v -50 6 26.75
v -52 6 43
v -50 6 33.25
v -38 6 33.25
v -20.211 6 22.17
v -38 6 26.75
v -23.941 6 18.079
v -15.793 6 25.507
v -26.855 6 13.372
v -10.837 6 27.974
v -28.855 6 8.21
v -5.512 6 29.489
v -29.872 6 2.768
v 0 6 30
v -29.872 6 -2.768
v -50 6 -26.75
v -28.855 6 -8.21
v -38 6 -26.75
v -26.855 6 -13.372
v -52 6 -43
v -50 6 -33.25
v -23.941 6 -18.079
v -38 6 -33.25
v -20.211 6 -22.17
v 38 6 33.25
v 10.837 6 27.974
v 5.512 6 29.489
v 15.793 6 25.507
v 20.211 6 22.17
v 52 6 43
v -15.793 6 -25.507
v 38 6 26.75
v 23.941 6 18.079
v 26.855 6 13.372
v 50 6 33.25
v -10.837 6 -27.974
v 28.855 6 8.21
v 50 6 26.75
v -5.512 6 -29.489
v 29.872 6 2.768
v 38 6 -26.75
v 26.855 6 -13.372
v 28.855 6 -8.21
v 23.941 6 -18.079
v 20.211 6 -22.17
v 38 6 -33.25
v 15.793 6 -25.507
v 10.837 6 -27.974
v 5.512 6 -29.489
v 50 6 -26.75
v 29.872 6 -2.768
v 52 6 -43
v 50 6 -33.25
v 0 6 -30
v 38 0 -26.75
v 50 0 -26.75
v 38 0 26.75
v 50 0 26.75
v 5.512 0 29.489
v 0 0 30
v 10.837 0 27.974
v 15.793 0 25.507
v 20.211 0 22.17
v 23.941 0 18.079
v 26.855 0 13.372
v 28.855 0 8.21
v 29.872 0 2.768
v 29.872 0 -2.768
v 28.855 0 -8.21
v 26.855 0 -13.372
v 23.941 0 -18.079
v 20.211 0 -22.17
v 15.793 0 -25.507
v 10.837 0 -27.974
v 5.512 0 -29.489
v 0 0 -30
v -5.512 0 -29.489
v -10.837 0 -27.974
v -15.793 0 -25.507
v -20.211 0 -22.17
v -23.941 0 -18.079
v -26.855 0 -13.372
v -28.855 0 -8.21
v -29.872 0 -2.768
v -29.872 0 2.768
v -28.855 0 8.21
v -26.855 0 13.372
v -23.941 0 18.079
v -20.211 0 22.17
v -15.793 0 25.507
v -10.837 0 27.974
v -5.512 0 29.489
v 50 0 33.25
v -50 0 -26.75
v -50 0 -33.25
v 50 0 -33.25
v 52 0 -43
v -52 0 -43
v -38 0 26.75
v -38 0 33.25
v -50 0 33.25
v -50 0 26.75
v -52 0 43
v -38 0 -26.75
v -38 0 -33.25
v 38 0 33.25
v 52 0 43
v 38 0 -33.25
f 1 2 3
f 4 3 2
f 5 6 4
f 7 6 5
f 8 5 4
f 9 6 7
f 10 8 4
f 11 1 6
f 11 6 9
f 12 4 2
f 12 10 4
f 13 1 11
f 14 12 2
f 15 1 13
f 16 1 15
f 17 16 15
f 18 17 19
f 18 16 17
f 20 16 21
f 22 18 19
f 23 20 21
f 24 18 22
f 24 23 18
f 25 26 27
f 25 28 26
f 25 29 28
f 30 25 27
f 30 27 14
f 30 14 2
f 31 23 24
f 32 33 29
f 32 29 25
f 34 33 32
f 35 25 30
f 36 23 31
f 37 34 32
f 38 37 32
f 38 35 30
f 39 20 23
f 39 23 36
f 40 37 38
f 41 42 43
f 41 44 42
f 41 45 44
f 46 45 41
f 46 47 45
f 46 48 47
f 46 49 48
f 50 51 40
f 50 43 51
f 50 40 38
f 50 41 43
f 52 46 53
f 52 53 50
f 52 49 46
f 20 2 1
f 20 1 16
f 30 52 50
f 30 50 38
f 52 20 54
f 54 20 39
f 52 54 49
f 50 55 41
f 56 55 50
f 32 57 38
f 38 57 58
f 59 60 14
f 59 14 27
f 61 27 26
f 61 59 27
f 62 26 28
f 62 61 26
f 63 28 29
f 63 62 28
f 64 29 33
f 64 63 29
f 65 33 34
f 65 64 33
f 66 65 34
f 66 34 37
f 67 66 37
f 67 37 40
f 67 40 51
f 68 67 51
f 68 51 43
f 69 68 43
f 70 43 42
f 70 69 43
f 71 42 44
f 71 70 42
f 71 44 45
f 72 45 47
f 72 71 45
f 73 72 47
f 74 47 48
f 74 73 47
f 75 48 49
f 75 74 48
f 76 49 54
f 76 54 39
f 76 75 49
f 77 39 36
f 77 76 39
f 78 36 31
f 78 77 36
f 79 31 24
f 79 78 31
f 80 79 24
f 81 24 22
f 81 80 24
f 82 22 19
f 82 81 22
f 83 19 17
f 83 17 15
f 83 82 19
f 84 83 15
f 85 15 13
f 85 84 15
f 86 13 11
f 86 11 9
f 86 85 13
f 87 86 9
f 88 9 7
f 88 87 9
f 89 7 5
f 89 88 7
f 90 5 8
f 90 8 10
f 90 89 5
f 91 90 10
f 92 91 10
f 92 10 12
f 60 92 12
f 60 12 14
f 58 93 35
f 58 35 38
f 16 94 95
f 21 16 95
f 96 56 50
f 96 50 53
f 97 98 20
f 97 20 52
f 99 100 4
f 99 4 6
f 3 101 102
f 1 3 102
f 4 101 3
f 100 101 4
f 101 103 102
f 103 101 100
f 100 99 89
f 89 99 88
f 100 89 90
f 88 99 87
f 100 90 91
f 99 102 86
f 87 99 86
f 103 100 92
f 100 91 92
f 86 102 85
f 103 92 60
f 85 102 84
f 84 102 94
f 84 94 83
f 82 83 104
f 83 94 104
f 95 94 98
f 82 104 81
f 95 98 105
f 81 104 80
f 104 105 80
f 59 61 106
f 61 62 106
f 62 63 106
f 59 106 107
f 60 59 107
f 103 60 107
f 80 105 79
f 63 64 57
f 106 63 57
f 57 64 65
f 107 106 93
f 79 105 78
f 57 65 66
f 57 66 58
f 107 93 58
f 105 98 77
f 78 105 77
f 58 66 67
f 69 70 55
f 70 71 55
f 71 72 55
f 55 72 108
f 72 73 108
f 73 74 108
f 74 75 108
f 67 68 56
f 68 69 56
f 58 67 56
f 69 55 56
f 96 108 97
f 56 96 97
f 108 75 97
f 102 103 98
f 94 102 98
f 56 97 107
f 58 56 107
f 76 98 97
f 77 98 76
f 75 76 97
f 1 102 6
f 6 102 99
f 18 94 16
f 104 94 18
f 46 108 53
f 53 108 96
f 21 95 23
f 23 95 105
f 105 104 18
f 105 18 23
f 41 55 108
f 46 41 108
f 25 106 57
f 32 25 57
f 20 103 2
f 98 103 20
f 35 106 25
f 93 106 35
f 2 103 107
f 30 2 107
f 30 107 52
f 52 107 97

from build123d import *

# Parameters (mm, degrees)
SKETCH1_W                = 104
SKETCH1_H                = 86
SKETCH1_R                = 30
SKETCH1_W_2              = 12
SKETCH1_H_2              = 6.5
MOTOR_CRADLE_PLATE_DEPTH = 6


with BuildPart() as part:
    # Sketch1 → Motor_Cradle_Plate (new body)
    with BuildSketch(Plane(origin=(0, 0, 0), x_dir=(1, 0, 0), z_dir=(0, 1, 0))):
        Rectangle(SKETCH1_W, SKETCH1_H)
        with Locations(Location((0, 0, 0), (0, 0, 270))):
            Circle(SKETCH1_R, mode=Mode.SUBTRACT)
        with Locations((-44, -30)):
            Rectangle(SKETCH1_W_2, SKETCH1_H_2, mode=Mode.SUBTRACT)
        with Locations((-44, 30)):
            Rectangle(SKETCH1_W_2, SKETCH1_H_2, mode=Mode.SUBTRACT)
        with Locations((44, -30)):
            Rectangle(SKETCH1_W_2, SKETCH1_H_2, mode=Mode.SUBTRACT)
        with Locations((44, 30)):
            Rectangle(SKETCH1_W_2, SKETCH1_H_2, mode=Mode.SUBTRACT)
    extrude(amount=MOTOR_CRADLE_PLATE_DEPTH)


solid = part.part
